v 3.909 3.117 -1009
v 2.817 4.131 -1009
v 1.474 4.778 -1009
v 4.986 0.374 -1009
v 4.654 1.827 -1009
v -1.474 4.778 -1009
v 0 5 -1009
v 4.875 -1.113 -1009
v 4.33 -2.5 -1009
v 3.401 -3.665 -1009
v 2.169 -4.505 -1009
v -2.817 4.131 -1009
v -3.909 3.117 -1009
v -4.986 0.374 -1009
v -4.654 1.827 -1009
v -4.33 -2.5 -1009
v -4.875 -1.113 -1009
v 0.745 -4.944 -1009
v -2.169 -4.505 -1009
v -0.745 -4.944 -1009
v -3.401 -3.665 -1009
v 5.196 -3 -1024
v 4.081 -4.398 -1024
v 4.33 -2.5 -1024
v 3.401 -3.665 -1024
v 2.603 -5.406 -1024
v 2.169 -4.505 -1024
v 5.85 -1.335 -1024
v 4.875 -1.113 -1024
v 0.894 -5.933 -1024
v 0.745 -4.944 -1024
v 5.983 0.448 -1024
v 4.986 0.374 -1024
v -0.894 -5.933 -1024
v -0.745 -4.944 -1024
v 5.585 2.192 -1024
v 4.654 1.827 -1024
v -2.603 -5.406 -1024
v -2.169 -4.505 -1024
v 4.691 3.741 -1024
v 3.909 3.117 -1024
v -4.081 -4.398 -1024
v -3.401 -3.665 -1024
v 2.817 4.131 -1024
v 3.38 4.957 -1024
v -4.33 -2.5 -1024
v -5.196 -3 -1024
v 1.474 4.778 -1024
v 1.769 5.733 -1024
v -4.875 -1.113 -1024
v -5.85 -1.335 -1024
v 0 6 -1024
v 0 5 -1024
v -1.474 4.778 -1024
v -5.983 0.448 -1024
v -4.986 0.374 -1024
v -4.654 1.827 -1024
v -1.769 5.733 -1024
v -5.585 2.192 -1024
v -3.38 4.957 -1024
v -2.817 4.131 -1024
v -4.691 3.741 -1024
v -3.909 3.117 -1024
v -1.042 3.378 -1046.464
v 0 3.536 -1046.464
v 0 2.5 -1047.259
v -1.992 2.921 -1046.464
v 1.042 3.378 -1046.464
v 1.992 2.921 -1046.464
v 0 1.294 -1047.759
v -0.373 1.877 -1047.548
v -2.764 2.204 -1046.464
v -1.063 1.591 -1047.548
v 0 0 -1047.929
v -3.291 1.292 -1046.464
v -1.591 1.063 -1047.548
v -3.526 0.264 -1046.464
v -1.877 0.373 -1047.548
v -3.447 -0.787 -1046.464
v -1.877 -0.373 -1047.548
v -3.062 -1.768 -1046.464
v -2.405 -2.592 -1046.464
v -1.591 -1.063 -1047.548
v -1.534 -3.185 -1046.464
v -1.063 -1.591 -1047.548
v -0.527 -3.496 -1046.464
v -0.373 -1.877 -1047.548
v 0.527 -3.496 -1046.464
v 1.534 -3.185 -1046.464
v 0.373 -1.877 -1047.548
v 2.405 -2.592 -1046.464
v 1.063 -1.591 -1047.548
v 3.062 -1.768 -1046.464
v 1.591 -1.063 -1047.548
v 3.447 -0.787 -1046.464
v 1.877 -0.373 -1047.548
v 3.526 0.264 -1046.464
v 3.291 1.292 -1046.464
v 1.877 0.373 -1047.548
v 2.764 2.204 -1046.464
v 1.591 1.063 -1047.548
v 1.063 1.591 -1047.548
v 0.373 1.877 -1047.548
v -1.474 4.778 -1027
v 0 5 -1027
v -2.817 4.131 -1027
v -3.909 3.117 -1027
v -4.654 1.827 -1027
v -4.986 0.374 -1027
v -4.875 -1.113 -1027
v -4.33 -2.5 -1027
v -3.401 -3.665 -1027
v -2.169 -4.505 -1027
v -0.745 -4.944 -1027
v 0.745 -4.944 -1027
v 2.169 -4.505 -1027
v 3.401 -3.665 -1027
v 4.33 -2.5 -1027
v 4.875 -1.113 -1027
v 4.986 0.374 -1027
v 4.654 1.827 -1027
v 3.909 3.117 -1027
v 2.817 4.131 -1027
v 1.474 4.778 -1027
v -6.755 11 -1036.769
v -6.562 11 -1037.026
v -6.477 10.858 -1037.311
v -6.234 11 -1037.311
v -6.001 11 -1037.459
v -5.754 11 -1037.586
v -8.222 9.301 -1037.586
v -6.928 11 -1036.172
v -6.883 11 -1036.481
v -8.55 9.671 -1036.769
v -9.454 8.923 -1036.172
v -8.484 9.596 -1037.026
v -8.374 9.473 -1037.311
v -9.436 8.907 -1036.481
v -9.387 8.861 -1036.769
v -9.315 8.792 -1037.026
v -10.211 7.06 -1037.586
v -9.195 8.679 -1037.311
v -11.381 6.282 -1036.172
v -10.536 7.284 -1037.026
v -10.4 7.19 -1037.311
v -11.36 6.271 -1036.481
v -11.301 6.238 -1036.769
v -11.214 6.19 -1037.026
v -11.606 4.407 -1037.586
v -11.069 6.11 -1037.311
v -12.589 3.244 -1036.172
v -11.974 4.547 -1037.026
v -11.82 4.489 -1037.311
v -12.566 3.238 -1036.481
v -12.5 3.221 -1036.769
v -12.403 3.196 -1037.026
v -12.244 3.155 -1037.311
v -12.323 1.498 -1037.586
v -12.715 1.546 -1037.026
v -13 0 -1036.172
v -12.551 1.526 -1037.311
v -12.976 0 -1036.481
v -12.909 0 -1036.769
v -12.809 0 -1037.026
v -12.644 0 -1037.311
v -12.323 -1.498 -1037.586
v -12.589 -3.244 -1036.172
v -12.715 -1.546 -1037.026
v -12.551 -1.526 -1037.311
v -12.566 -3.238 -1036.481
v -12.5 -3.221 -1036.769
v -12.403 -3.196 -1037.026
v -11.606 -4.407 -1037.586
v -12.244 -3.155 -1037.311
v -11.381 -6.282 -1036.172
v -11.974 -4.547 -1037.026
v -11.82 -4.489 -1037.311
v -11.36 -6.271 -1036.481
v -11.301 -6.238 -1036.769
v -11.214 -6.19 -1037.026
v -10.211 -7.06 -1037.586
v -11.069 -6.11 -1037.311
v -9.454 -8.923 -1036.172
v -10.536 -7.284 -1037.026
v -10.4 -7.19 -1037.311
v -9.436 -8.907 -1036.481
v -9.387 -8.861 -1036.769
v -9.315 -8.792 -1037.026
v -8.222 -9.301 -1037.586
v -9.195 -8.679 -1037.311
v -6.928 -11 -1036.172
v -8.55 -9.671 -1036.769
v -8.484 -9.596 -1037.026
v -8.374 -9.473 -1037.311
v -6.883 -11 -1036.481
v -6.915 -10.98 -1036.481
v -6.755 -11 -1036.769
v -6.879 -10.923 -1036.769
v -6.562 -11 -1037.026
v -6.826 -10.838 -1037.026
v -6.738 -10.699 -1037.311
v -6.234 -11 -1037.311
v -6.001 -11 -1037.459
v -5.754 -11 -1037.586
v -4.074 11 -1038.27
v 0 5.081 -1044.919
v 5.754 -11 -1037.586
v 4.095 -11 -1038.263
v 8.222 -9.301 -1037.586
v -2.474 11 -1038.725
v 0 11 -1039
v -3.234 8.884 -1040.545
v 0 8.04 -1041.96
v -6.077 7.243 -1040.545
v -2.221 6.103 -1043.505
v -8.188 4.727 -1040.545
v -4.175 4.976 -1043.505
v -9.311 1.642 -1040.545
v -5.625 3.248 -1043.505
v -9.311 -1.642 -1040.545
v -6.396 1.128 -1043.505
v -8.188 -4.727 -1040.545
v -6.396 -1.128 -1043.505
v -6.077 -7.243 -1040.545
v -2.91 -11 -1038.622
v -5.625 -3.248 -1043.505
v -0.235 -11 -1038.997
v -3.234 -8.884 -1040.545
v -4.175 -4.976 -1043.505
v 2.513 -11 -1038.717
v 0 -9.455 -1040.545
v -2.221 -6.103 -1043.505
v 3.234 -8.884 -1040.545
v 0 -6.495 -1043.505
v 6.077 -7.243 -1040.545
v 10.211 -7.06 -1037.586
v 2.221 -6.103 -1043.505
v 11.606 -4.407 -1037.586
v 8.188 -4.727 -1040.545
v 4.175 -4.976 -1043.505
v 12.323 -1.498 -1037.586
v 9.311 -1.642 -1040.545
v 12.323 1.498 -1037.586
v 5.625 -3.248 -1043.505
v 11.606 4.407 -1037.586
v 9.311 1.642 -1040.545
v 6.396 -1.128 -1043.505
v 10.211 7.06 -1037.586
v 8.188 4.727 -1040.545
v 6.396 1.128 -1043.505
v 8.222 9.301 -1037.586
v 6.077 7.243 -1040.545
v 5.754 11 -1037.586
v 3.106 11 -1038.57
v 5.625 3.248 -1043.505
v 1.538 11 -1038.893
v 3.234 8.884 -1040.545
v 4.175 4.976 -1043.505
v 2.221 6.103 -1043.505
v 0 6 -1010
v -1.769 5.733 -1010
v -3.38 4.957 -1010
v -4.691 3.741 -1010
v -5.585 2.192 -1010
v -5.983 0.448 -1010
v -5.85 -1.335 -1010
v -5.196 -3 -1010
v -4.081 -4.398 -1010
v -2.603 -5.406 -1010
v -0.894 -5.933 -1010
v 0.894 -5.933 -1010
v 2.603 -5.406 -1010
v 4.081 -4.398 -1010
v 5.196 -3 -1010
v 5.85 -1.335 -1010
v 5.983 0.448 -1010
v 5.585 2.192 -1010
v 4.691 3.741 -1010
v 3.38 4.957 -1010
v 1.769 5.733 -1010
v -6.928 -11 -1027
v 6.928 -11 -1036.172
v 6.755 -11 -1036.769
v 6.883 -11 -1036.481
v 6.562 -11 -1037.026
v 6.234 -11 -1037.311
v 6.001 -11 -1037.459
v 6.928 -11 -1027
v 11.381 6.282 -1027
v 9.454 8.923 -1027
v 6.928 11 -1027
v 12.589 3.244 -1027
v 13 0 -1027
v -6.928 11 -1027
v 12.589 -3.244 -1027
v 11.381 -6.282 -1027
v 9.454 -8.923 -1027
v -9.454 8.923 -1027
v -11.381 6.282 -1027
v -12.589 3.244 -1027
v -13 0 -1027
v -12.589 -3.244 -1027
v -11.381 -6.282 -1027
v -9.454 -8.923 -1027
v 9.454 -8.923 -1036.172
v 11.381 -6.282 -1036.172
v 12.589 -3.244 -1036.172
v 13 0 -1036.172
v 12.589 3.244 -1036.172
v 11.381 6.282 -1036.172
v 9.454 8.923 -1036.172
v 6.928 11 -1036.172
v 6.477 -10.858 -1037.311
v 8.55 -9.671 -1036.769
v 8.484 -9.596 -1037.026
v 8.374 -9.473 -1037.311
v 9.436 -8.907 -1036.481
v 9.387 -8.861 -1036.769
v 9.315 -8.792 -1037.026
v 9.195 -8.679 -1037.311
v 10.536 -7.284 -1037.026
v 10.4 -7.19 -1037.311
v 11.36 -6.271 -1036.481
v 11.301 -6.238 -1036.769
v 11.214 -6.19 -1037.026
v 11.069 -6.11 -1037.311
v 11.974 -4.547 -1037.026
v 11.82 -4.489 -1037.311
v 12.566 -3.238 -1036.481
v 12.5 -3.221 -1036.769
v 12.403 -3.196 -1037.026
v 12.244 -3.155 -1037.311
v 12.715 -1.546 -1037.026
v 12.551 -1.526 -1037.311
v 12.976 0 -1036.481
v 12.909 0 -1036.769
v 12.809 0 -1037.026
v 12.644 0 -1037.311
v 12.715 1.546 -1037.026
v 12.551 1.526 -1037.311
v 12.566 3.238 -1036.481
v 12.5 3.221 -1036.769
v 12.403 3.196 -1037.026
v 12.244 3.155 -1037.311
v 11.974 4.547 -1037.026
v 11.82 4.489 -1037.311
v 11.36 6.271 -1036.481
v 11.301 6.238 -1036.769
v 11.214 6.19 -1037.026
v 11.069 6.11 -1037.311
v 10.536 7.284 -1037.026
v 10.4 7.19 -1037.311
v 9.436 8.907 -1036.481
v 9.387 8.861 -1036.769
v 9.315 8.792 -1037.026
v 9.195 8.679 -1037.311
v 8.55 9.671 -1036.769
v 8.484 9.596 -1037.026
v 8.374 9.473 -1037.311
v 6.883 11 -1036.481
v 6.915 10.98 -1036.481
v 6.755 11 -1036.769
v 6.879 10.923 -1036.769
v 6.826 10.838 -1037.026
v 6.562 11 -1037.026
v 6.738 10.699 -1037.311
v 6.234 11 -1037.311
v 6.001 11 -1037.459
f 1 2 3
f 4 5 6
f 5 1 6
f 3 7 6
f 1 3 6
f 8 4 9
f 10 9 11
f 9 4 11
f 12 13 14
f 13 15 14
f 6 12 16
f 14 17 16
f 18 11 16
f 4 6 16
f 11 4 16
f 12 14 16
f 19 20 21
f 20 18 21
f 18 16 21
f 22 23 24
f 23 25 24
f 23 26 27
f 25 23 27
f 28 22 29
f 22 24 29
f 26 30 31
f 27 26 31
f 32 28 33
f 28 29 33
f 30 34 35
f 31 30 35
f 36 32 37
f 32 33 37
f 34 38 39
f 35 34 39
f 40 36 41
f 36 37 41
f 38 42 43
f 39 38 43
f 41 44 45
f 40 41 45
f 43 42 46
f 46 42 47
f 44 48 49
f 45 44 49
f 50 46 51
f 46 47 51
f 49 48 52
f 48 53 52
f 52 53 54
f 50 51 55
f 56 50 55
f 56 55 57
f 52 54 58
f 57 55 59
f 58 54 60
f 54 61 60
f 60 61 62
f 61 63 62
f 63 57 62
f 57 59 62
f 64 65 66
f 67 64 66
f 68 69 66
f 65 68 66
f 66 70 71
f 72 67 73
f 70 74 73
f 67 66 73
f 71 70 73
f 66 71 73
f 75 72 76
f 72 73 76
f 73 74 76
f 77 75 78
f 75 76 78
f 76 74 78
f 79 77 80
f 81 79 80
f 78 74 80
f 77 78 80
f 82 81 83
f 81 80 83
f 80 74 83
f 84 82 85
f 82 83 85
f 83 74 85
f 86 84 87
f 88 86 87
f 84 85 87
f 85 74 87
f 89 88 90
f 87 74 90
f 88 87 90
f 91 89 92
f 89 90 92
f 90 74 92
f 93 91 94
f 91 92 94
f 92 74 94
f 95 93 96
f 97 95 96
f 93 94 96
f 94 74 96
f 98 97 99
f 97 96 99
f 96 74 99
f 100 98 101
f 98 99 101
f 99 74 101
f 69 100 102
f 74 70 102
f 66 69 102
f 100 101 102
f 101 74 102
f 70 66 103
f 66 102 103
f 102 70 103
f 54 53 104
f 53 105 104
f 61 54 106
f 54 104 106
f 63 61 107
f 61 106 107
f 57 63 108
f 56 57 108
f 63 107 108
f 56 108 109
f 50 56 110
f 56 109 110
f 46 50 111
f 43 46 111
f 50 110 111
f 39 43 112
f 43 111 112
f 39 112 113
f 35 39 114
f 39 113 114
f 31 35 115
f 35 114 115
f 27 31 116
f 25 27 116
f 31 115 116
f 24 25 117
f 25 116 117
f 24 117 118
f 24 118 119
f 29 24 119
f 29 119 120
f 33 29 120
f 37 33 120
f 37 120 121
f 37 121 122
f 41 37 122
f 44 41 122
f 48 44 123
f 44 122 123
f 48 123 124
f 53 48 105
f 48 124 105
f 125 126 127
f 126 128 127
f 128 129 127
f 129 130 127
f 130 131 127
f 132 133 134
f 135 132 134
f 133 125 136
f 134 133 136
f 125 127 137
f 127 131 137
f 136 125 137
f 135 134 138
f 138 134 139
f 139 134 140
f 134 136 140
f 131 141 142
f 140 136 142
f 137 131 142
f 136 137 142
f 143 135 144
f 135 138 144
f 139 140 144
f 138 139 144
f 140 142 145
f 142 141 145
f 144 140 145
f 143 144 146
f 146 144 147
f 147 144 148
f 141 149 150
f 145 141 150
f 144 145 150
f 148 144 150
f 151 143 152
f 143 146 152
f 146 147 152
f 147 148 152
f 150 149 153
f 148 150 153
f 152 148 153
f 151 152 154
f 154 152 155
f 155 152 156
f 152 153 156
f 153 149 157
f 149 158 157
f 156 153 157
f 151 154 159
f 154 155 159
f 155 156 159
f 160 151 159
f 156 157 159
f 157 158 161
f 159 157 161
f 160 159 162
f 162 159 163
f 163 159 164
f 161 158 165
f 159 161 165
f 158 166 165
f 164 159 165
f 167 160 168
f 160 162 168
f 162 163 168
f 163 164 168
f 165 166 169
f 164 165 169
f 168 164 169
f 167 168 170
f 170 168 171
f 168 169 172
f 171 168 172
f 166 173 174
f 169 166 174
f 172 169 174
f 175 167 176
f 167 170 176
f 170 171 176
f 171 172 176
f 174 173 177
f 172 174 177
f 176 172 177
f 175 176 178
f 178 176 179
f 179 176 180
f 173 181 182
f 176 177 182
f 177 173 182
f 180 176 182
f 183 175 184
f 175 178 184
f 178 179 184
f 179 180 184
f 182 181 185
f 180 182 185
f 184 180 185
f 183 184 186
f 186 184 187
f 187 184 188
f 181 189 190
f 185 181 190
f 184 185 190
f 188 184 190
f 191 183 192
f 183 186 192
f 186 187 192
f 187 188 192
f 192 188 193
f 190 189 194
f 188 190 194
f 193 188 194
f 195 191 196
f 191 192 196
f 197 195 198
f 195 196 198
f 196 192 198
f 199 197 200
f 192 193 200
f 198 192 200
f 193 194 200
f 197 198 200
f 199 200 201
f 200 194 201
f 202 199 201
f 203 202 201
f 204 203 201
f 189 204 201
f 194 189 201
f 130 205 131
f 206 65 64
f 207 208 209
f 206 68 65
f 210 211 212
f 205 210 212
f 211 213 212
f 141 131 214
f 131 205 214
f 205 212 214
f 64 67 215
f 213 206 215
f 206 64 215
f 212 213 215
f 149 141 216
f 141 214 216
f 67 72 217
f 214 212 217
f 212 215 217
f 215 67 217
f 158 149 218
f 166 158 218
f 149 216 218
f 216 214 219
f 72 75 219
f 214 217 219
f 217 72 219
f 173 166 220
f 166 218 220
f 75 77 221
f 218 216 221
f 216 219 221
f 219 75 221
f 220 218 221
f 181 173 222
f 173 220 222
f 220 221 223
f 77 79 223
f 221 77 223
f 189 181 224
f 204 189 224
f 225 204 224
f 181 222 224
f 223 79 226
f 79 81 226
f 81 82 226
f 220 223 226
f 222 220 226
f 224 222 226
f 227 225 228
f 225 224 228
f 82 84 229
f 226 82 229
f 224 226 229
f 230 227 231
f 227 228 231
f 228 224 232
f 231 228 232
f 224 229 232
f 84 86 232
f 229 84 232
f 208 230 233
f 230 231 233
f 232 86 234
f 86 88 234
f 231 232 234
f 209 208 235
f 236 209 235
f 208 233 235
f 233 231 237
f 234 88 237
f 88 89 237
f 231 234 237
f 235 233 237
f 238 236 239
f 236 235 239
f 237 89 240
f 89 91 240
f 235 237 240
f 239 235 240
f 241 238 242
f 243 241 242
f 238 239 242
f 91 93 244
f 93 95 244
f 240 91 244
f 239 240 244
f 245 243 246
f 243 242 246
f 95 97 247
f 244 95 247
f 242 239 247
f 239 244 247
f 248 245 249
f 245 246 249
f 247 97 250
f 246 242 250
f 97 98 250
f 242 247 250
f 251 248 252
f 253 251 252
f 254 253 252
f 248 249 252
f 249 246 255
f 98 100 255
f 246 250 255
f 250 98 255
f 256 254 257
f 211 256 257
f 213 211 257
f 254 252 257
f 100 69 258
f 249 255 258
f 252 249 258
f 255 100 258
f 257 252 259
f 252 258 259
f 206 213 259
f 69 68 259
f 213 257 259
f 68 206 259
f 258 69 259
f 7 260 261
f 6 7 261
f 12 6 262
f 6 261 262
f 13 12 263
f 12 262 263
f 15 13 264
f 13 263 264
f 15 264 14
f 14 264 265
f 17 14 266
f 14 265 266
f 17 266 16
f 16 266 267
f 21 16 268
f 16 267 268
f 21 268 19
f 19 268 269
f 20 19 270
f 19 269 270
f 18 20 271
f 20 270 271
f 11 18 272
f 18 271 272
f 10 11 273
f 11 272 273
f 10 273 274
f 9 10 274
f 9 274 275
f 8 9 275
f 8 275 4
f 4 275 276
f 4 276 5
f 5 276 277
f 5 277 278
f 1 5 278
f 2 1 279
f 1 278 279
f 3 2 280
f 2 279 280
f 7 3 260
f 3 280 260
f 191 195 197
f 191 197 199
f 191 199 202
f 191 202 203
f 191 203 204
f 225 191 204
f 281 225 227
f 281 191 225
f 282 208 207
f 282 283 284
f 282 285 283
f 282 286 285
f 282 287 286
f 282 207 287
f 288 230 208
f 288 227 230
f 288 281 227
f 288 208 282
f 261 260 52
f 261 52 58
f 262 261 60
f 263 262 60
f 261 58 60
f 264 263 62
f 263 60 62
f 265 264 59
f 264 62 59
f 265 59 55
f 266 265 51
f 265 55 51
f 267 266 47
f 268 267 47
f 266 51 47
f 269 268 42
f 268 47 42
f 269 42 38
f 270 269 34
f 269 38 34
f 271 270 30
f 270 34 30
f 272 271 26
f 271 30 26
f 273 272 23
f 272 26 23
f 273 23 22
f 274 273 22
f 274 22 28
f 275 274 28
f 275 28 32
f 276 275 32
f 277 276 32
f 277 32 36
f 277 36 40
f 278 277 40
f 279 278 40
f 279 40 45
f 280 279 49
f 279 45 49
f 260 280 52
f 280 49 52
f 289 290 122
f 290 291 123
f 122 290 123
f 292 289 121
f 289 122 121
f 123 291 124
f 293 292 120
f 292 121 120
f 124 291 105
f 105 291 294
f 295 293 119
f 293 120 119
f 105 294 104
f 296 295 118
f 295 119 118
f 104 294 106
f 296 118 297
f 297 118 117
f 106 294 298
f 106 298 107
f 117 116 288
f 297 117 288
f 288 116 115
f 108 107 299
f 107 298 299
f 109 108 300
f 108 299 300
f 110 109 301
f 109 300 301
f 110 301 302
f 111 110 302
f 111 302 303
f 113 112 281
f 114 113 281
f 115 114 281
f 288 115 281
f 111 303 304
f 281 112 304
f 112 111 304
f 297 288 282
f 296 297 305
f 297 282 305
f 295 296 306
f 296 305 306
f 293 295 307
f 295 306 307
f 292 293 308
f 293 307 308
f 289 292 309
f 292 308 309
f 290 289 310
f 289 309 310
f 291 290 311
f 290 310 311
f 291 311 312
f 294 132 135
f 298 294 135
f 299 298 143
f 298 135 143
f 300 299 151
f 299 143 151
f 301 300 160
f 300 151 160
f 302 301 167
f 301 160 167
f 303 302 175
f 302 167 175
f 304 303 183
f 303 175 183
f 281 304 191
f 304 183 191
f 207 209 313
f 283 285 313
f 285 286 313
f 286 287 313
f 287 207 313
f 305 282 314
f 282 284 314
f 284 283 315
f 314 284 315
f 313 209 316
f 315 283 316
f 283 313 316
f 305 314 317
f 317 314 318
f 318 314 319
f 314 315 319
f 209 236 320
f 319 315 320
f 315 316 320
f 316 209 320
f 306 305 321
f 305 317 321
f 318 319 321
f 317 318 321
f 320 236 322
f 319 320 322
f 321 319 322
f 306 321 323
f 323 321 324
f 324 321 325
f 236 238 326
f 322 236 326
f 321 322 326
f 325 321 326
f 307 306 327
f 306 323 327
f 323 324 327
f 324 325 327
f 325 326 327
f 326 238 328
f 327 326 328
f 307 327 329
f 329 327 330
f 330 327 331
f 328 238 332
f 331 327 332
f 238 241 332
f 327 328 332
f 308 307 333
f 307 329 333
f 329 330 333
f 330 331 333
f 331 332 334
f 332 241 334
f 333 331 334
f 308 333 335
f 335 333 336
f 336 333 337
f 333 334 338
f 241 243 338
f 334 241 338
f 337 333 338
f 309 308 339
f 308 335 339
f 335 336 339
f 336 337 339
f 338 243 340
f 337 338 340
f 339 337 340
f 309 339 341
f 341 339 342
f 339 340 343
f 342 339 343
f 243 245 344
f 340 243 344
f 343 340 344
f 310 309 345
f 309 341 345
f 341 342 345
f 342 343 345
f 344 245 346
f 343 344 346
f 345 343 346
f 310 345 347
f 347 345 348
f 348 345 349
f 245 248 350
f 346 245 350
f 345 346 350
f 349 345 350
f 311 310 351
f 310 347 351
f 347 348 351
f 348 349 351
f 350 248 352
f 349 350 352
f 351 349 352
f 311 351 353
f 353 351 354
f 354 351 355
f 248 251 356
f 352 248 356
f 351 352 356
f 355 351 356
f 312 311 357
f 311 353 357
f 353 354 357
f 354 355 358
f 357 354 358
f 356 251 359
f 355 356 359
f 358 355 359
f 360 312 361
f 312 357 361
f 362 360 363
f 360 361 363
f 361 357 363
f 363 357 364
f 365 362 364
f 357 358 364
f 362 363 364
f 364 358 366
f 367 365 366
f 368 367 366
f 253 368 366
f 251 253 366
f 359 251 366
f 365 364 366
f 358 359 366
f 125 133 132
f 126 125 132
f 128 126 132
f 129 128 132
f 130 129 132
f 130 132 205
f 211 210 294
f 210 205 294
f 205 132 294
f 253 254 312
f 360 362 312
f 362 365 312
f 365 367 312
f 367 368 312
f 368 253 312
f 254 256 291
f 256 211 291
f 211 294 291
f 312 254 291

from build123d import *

# Parameters (mm, degrees)
SKETCH2_W               = 46
SKETCH2_H               = 42
SKETCH2_W_2             = 26
SKETCH2_H_2             = 22
CUT_EXTRUDE_THIN1_DEPTH = 21.928932188
CHAMFER1_SIZE           = 1


with BuildPart() as part:
    # Sketch1 → Revolve1 (revolve)
    with BuildSketch(Plane(origin=(0, 0, 0), x_dir=(0, 0, -1), z_dir=(1, 0, 0))):
        with BuildLine():
            Line((1009, 0), (1009, 6))
            Line((1009, 6), (1024, 6))
            Line((1024, 6), (1024, 5))
            Line((1024, 5), (1027, 5))
            Line((1027, 5), (1027, 13))
            Line((1027, 13), (1036.171572875, 13))
            ThreePointArc((1036.171572875, 13), (1036.93693974, 12.847759065), (1037.585786438, 12.414213562))
            Line((1037.585786438, 12.414213562), (1046.464466094, 3.535533906))
            ThreePointArc((1046.464466094, 3.535533906), (1047.548329851, 1.913417162), (1047.928932188, 0))
            Line((1047.928932188, 0), (1009, 0))
        make_face()
    revolve(axis=Axis((0, 0, -1178.108206327), (0, 0, 1)))

    # Sketch2 → Cut-Extrude-Thin1 (cut, through all)
    with BuildSketch(Plane.XY.offset(-1027)):
        Rectangle(SKETCH2_W, SKETCH2_H)
        Rectangle(SKETCH2_W_2, SKETCH2_H_2, mode=Mode.SUBTRACT)
    extrude(amount=-CUT_EXTRUDE_THIN1_DEPTH, mode=Mode.SUBTRACT)

    # Chamfer1
    chamfer1_edges = [part.edges().sort_by_distance(p)[0] for p in [
        (0, -6, -1009),
    ]]
    chamfer(chamfer1_edges, length=CHAMFER1_SIZE)


solid = part.part
